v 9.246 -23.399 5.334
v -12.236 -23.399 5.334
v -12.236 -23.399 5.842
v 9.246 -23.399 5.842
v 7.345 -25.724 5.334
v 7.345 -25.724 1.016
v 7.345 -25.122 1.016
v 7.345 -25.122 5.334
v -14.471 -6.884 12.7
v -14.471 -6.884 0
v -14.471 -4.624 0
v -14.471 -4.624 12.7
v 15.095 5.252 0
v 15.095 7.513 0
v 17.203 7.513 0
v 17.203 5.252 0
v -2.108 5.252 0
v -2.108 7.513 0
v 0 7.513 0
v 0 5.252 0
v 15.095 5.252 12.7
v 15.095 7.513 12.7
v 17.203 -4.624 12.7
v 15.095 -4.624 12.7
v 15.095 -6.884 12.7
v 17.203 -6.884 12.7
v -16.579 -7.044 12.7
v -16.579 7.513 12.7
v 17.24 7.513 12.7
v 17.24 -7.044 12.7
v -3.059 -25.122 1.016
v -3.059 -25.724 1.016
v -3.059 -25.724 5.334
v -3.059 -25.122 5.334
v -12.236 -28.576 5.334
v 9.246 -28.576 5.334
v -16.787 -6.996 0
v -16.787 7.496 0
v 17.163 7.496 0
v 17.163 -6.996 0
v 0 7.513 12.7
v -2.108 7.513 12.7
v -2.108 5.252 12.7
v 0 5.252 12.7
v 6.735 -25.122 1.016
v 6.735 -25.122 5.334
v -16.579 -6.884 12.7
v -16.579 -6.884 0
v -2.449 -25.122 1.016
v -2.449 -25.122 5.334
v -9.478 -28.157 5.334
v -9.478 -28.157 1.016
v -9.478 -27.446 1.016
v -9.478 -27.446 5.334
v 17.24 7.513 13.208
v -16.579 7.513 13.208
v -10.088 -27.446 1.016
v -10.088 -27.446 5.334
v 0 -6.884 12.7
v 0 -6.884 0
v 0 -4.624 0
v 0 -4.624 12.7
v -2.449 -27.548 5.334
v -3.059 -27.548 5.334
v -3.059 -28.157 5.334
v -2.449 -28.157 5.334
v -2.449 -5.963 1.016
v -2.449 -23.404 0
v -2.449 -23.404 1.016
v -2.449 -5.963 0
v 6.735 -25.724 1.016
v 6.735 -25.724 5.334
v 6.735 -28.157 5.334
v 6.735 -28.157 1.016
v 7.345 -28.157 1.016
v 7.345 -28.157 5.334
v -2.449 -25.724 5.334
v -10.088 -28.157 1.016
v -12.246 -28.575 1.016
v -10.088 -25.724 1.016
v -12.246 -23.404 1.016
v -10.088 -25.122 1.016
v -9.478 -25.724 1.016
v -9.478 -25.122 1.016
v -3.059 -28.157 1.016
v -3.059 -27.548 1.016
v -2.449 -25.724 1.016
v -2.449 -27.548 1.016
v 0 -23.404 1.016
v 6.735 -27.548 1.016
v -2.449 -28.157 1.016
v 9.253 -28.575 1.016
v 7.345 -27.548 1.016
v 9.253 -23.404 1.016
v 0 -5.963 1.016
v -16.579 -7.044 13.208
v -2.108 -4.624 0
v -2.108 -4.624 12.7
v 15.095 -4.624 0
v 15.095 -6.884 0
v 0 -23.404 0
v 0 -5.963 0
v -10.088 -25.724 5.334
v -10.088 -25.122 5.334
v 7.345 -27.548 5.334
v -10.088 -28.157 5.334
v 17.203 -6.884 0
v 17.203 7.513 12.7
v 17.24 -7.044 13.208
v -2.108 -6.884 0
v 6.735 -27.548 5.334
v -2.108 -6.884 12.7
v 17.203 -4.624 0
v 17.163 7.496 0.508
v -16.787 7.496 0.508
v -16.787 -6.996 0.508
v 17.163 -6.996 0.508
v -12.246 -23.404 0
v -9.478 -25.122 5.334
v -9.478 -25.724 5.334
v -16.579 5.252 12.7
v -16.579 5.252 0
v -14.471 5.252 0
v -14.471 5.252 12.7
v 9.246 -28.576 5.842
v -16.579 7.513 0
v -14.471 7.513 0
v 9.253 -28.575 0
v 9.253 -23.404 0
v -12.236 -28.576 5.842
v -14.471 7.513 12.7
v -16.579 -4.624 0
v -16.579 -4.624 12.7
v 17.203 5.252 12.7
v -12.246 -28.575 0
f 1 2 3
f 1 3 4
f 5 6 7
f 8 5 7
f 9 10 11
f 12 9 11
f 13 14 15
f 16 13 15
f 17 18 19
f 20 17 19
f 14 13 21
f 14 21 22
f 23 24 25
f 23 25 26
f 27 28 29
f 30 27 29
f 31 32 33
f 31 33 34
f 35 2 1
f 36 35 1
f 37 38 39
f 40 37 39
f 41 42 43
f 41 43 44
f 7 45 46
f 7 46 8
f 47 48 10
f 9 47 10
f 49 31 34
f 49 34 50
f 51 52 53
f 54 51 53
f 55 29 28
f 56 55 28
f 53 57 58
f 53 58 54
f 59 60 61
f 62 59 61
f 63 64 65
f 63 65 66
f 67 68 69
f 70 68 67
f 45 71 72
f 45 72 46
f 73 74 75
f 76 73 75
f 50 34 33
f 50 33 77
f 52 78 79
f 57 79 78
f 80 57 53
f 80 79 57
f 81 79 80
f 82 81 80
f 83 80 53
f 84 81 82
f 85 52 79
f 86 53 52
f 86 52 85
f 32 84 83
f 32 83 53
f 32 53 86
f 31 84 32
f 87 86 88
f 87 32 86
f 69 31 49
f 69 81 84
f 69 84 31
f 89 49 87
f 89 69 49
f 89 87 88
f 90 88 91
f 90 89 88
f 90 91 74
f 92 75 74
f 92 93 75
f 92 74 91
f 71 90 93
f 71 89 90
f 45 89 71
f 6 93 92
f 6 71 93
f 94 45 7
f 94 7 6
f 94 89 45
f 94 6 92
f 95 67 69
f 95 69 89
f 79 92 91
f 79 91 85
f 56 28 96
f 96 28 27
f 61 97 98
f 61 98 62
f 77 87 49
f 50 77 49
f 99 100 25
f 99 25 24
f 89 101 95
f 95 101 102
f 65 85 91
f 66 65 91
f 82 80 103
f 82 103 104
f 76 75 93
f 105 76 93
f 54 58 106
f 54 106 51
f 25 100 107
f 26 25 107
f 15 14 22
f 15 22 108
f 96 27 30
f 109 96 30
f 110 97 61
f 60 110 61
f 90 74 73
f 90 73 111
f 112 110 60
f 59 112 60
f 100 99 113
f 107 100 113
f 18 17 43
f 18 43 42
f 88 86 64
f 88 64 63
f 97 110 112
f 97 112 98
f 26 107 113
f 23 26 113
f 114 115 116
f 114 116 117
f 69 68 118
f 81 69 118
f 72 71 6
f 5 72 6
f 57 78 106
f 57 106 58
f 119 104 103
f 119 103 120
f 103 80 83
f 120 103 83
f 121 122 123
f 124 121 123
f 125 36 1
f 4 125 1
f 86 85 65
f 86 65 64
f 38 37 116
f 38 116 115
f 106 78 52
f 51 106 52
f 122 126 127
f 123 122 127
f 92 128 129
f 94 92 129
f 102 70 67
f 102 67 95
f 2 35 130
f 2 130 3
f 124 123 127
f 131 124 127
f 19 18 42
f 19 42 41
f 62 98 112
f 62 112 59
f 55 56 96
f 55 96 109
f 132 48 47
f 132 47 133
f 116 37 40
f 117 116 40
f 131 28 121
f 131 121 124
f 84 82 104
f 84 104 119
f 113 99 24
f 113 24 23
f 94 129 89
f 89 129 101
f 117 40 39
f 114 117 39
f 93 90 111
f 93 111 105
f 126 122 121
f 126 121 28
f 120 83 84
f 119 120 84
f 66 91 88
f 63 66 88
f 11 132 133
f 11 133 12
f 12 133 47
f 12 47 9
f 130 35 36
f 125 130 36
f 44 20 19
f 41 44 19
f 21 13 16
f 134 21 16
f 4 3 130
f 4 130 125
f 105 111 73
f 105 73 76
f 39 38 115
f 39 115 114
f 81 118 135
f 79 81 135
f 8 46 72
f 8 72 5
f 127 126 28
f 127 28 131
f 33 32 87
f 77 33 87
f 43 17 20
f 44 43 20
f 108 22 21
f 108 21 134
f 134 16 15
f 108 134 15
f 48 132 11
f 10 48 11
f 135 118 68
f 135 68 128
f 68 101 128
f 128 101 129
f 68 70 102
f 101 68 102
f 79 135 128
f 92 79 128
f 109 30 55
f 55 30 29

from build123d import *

# Parameters (mm, degrees)
F1_W      = 2.1082
F1_H      = 2.2606
F2_DEPTH  = 12.7
F0_W      = 2.4492868688
F0_H      = 17.4416182563
F3_DEPTH  = 1.016
F4_W      = 0.6096
F4_H      = 0.6012953818
F4_H_2    = 0.7112
F4_H_3    = 0.6096
F5_DEPTH  = 4.318
F6_W      = 21.482726559
F6_H      = 5.1775947213
F6_W_2    = 0.6096
F6_H_2    = 0.6012953818
F7_DEPTH  = 0.508
F8_W      = 33.9498203248
F8_H      = 14.4916079007
F9_DEPTH  = 0.508
F10_W     = 2.1082
F10_H     = 2.2606
F11_DEPTH = 0.508


# Not quite as in the source:
# - a feature names something its author has since deleted; it is built from what else it names


with BuildPart() as f2:
    # F1 (on Top) → F2 (new body)
    with BuildSketch(Plane.XY):
        with Locations((-15.5251261375, 6.3823008758)):
            Rectangle(F1_W, F1_H)
    extrude(amount=F2_DEPTH)


with BuildPart() as f2b:
    # F1 (on Top) → F2, piece 2 (new body)
    with BuildSketch(Plane.XY):
        with Locations((-15.5251261375, -5.7539824548)):
            Rectangle(F1_W, F1_H)
    extrude(amount=F2_DEPTH)


with BuildPart() as f2c:
    # F1 (on Top) → F2, piece 3 (new body)
    with BuildSketch(Plane.XY):
        with Locations((-1.0541, 6.3823008758)):
            Rectangle(F1_W, F1_H)
    extrude(amount=F2_DEPTH)


with BuildPart() as f2d:
    # F1 (on Top) → F2, piece 4 (new body)
    with BuildSketch(Plane.XY):
        with Locations((-1.0541, -5.7539824548)):
            Rectangle(F1_W, F1_H)
    extrude(amount=F2_DEPTH)


with BuildPart() as f2e:
    # F1 (on Top) → F2, piece 5 (new body)
    with BuildSketch(Plane.XY):
        with Locations((16.14880772, 6.3823008758)):
            Rectangle(F1_W, F1_H)
    extrude(amount=F2_DEPTH)


with BuildPart() as f2f:
    # F1 (on Top) → F2, piece 6 (new body)
    with BuildSketch(Plane.XY):
        with Locations((16.14880772, -5.7539824548)):
            Rectangle(F1_W, F1_H)
    extrude(amount=F2_DEPTH)


with BuildPart() as f3:
    # F0 (on Top) → F3 (new body)
    with BuildSketch(Plane.XY):
        with Locations((-1.2246434344, -14.6834761836)):
            Rectangle(F0_W, F0_H)
        Polygon((9.2528564855, -23.4042853117), (0, -23.4042853117), (-2.4492868688, -23.4042853117), (-12.2464280576, -23.4042853117), (-12.2464280576, -28.5750012845), (9.2528564855, -28.5750012845), align=None)
    extrude(amount=F3_DEPTH)

    # F4 (on face) → F5 (join)
    with BuildSketch(Plane.XY.offset(1.016)):
        with Locations((-9.7829406224, -25.4231281579)):
            Rectangle(F4_W, F4_H)
        with Locations((-9.7829406224, -27.8016733074)):
            Rectangle(F4_W, F4_H_2)
        with Locations((-2.7540868688, -25.4231281579)):
            Rectangle(F4_W, F4_H)
        with Locations((-2.7540868688, -27.8524733074)):
            Rectangle(F4_W, F4_H_3)
        with Locations((7.0400689803, -25.4231281579)):
            Rectangle(F4_W, F4_H)
        with Locations((7.0400689803, -27.8524733074)):
            Rectangle(F4_W, F4_H_3)
    extrude(amount=F5_DEPTH)


with BuildPart() as f7:
    # F6 (on face) → F7 (new body)
    with BuildSketch(Plane.XY.offset(5.334)):
        with Locations((-1.4948770404, -25.9876903147)):
            Rectangle(F6_W, F6_H)
        with Locations((-9.7829406224, -25.4231281579)):
            Rectangle(F6_W_2, F6_H_2, mode=Mode.SUBTRACT)
        with Locations((-9.7829406224, -25.4231281579)):
            Rectangle(F6_W_2, F6_H_2)
    extrude(amount=F7_DEPTH)


with BuildPart() as f9:
    # F8 (on Top) → F9 (new body)
    with BuildSketch(Plane.XY):
        with Locations((0.1881280914, 0.2499890979)):
            Rectangle(F8_W, F8_H)
    extrude(amount=F9_DEPTH)


with BuildPart() as f11:
    # F10 (on face) → F11 (new body)
    with BuildSketch(Plane.XY.offset(12.7)):
        Polygon((17.2401238233, 7.5126008758), (-14.4710261375, 7.5126008758), (-14.4710261375, 5.2520008758), (-16.5792261375, 5.2520008758), (-16.5792261375, -7.0438468829), (17.2401238233, -7.0438468829), align=None)
        with Locations((-15.5251261375, 6.3823008758)):
            Rectangle(F10_W, F10_H)
    extrude(amount=F11_DEPTH)


solid = Compound([f2.part, f2b.part, f2c.part, f2d.part, f2e.part, f2f.part, f3.part, f7.part, f9.part, f11.part])
